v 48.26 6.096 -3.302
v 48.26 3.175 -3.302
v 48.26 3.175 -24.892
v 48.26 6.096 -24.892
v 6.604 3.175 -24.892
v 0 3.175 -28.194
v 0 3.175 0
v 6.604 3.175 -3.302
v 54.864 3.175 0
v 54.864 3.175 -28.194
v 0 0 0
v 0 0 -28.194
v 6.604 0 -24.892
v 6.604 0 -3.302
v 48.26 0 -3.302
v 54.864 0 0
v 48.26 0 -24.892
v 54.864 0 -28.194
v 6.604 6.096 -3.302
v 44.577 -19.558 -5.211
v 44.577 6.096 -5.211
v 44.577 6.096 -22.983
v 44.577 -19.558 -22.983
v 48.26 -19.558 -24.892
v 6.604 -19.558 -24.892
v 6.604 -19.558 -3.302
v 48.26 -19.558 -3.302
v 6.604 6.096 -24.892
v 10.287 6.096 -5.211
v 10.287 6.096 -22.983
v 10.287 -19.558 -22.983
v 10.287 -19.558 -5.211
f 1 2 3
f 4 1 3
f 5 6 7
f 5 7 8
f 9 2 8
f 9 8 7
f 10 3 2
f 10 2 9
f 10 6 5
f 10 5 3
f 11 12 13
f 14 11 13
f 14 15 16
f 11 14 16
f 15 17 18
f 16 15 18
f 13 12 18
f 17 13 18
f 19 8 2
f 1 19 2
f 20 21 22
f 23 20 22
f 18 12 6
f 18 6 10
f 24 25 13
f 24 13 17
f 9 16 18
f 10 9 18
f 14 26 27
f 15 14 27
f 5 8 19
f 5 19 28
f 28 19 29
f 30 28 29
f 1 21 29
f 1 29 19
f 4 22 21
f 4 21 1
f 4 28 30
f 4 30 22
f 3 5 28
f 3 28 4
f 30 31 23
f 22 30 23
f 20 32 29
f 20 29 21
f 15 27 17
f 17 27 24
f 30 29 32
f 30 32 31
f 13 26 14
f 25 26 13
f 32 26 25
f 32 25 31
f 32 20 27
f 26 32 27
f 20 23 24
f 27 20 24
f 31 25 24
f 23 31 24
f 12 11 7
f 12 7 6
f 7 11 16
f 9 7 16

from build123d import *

# Parameters (mm, degrees)
SKETCH1_W                = 54.864
SKETCH1_H                = 28.194
SKETCH1_W_2              = 41.656
SKETCH1_H_2              = 21.59
BOSS_EXTRUDE1_DEPTH      = 3.175
BOSS_EXTRUDE2_DEPTH      = 6.096
BOSS_EXTRUDE2_DEPTH_BACK = 19.558
SKETCH1_3_W              = 41.656
SKETCH1_3_H              = 21.59
SKETCH1_3_W_2            = 34.29
SKETCH1_3_H_2            = 17.772256098


with BuildPart() as part:
    # Sketch1 → Boss-Extrude1 (new body)
    with BuildSketch(Plane(origin=(0, 0, 0), x_dir=(1, 0, 0), z_dir=(0, 1, 0))):
        with Locations((27.432, 14.097)):
            Rectangle(SKETCH1_W, SKETCH1_H)
        with Locations((27.432, 14.097)):
            Rectangle(SKETCH1_W_2, SKETCH1_H_2, mode=Mode.SUBTRACT)
    extrude(amount=BOSS_EXTRUDE1_DEPTH)

    # Sketch1<3> → Boss-Extrude2 (add, two sides: drawn at the far end of the back side and taken through both)
    with BuildSketch(Plane(origin=(0, 0, 0), x_dir=(1, 0, 0), z_dir=(0, 1, 0)).offset(-BOSS_EXTRUDE2_DEPTH_BACK)):
        with Locations((27.432, 14.097)):
            Rectangle(SKETCH1_3_W, SKETCH1_3_H)
        with Locations((27.432, 14.097)):
            Rectangle(SKETCH1_3_W_2, SKETCH1_3_H_2, mode=Mode.SUBTRACT)
    extrude(amount=BOSS_EXTRUDE2_DEPTH + BOSS_EXTRUDE2_DEPTH_BACK)


solid = part.part
